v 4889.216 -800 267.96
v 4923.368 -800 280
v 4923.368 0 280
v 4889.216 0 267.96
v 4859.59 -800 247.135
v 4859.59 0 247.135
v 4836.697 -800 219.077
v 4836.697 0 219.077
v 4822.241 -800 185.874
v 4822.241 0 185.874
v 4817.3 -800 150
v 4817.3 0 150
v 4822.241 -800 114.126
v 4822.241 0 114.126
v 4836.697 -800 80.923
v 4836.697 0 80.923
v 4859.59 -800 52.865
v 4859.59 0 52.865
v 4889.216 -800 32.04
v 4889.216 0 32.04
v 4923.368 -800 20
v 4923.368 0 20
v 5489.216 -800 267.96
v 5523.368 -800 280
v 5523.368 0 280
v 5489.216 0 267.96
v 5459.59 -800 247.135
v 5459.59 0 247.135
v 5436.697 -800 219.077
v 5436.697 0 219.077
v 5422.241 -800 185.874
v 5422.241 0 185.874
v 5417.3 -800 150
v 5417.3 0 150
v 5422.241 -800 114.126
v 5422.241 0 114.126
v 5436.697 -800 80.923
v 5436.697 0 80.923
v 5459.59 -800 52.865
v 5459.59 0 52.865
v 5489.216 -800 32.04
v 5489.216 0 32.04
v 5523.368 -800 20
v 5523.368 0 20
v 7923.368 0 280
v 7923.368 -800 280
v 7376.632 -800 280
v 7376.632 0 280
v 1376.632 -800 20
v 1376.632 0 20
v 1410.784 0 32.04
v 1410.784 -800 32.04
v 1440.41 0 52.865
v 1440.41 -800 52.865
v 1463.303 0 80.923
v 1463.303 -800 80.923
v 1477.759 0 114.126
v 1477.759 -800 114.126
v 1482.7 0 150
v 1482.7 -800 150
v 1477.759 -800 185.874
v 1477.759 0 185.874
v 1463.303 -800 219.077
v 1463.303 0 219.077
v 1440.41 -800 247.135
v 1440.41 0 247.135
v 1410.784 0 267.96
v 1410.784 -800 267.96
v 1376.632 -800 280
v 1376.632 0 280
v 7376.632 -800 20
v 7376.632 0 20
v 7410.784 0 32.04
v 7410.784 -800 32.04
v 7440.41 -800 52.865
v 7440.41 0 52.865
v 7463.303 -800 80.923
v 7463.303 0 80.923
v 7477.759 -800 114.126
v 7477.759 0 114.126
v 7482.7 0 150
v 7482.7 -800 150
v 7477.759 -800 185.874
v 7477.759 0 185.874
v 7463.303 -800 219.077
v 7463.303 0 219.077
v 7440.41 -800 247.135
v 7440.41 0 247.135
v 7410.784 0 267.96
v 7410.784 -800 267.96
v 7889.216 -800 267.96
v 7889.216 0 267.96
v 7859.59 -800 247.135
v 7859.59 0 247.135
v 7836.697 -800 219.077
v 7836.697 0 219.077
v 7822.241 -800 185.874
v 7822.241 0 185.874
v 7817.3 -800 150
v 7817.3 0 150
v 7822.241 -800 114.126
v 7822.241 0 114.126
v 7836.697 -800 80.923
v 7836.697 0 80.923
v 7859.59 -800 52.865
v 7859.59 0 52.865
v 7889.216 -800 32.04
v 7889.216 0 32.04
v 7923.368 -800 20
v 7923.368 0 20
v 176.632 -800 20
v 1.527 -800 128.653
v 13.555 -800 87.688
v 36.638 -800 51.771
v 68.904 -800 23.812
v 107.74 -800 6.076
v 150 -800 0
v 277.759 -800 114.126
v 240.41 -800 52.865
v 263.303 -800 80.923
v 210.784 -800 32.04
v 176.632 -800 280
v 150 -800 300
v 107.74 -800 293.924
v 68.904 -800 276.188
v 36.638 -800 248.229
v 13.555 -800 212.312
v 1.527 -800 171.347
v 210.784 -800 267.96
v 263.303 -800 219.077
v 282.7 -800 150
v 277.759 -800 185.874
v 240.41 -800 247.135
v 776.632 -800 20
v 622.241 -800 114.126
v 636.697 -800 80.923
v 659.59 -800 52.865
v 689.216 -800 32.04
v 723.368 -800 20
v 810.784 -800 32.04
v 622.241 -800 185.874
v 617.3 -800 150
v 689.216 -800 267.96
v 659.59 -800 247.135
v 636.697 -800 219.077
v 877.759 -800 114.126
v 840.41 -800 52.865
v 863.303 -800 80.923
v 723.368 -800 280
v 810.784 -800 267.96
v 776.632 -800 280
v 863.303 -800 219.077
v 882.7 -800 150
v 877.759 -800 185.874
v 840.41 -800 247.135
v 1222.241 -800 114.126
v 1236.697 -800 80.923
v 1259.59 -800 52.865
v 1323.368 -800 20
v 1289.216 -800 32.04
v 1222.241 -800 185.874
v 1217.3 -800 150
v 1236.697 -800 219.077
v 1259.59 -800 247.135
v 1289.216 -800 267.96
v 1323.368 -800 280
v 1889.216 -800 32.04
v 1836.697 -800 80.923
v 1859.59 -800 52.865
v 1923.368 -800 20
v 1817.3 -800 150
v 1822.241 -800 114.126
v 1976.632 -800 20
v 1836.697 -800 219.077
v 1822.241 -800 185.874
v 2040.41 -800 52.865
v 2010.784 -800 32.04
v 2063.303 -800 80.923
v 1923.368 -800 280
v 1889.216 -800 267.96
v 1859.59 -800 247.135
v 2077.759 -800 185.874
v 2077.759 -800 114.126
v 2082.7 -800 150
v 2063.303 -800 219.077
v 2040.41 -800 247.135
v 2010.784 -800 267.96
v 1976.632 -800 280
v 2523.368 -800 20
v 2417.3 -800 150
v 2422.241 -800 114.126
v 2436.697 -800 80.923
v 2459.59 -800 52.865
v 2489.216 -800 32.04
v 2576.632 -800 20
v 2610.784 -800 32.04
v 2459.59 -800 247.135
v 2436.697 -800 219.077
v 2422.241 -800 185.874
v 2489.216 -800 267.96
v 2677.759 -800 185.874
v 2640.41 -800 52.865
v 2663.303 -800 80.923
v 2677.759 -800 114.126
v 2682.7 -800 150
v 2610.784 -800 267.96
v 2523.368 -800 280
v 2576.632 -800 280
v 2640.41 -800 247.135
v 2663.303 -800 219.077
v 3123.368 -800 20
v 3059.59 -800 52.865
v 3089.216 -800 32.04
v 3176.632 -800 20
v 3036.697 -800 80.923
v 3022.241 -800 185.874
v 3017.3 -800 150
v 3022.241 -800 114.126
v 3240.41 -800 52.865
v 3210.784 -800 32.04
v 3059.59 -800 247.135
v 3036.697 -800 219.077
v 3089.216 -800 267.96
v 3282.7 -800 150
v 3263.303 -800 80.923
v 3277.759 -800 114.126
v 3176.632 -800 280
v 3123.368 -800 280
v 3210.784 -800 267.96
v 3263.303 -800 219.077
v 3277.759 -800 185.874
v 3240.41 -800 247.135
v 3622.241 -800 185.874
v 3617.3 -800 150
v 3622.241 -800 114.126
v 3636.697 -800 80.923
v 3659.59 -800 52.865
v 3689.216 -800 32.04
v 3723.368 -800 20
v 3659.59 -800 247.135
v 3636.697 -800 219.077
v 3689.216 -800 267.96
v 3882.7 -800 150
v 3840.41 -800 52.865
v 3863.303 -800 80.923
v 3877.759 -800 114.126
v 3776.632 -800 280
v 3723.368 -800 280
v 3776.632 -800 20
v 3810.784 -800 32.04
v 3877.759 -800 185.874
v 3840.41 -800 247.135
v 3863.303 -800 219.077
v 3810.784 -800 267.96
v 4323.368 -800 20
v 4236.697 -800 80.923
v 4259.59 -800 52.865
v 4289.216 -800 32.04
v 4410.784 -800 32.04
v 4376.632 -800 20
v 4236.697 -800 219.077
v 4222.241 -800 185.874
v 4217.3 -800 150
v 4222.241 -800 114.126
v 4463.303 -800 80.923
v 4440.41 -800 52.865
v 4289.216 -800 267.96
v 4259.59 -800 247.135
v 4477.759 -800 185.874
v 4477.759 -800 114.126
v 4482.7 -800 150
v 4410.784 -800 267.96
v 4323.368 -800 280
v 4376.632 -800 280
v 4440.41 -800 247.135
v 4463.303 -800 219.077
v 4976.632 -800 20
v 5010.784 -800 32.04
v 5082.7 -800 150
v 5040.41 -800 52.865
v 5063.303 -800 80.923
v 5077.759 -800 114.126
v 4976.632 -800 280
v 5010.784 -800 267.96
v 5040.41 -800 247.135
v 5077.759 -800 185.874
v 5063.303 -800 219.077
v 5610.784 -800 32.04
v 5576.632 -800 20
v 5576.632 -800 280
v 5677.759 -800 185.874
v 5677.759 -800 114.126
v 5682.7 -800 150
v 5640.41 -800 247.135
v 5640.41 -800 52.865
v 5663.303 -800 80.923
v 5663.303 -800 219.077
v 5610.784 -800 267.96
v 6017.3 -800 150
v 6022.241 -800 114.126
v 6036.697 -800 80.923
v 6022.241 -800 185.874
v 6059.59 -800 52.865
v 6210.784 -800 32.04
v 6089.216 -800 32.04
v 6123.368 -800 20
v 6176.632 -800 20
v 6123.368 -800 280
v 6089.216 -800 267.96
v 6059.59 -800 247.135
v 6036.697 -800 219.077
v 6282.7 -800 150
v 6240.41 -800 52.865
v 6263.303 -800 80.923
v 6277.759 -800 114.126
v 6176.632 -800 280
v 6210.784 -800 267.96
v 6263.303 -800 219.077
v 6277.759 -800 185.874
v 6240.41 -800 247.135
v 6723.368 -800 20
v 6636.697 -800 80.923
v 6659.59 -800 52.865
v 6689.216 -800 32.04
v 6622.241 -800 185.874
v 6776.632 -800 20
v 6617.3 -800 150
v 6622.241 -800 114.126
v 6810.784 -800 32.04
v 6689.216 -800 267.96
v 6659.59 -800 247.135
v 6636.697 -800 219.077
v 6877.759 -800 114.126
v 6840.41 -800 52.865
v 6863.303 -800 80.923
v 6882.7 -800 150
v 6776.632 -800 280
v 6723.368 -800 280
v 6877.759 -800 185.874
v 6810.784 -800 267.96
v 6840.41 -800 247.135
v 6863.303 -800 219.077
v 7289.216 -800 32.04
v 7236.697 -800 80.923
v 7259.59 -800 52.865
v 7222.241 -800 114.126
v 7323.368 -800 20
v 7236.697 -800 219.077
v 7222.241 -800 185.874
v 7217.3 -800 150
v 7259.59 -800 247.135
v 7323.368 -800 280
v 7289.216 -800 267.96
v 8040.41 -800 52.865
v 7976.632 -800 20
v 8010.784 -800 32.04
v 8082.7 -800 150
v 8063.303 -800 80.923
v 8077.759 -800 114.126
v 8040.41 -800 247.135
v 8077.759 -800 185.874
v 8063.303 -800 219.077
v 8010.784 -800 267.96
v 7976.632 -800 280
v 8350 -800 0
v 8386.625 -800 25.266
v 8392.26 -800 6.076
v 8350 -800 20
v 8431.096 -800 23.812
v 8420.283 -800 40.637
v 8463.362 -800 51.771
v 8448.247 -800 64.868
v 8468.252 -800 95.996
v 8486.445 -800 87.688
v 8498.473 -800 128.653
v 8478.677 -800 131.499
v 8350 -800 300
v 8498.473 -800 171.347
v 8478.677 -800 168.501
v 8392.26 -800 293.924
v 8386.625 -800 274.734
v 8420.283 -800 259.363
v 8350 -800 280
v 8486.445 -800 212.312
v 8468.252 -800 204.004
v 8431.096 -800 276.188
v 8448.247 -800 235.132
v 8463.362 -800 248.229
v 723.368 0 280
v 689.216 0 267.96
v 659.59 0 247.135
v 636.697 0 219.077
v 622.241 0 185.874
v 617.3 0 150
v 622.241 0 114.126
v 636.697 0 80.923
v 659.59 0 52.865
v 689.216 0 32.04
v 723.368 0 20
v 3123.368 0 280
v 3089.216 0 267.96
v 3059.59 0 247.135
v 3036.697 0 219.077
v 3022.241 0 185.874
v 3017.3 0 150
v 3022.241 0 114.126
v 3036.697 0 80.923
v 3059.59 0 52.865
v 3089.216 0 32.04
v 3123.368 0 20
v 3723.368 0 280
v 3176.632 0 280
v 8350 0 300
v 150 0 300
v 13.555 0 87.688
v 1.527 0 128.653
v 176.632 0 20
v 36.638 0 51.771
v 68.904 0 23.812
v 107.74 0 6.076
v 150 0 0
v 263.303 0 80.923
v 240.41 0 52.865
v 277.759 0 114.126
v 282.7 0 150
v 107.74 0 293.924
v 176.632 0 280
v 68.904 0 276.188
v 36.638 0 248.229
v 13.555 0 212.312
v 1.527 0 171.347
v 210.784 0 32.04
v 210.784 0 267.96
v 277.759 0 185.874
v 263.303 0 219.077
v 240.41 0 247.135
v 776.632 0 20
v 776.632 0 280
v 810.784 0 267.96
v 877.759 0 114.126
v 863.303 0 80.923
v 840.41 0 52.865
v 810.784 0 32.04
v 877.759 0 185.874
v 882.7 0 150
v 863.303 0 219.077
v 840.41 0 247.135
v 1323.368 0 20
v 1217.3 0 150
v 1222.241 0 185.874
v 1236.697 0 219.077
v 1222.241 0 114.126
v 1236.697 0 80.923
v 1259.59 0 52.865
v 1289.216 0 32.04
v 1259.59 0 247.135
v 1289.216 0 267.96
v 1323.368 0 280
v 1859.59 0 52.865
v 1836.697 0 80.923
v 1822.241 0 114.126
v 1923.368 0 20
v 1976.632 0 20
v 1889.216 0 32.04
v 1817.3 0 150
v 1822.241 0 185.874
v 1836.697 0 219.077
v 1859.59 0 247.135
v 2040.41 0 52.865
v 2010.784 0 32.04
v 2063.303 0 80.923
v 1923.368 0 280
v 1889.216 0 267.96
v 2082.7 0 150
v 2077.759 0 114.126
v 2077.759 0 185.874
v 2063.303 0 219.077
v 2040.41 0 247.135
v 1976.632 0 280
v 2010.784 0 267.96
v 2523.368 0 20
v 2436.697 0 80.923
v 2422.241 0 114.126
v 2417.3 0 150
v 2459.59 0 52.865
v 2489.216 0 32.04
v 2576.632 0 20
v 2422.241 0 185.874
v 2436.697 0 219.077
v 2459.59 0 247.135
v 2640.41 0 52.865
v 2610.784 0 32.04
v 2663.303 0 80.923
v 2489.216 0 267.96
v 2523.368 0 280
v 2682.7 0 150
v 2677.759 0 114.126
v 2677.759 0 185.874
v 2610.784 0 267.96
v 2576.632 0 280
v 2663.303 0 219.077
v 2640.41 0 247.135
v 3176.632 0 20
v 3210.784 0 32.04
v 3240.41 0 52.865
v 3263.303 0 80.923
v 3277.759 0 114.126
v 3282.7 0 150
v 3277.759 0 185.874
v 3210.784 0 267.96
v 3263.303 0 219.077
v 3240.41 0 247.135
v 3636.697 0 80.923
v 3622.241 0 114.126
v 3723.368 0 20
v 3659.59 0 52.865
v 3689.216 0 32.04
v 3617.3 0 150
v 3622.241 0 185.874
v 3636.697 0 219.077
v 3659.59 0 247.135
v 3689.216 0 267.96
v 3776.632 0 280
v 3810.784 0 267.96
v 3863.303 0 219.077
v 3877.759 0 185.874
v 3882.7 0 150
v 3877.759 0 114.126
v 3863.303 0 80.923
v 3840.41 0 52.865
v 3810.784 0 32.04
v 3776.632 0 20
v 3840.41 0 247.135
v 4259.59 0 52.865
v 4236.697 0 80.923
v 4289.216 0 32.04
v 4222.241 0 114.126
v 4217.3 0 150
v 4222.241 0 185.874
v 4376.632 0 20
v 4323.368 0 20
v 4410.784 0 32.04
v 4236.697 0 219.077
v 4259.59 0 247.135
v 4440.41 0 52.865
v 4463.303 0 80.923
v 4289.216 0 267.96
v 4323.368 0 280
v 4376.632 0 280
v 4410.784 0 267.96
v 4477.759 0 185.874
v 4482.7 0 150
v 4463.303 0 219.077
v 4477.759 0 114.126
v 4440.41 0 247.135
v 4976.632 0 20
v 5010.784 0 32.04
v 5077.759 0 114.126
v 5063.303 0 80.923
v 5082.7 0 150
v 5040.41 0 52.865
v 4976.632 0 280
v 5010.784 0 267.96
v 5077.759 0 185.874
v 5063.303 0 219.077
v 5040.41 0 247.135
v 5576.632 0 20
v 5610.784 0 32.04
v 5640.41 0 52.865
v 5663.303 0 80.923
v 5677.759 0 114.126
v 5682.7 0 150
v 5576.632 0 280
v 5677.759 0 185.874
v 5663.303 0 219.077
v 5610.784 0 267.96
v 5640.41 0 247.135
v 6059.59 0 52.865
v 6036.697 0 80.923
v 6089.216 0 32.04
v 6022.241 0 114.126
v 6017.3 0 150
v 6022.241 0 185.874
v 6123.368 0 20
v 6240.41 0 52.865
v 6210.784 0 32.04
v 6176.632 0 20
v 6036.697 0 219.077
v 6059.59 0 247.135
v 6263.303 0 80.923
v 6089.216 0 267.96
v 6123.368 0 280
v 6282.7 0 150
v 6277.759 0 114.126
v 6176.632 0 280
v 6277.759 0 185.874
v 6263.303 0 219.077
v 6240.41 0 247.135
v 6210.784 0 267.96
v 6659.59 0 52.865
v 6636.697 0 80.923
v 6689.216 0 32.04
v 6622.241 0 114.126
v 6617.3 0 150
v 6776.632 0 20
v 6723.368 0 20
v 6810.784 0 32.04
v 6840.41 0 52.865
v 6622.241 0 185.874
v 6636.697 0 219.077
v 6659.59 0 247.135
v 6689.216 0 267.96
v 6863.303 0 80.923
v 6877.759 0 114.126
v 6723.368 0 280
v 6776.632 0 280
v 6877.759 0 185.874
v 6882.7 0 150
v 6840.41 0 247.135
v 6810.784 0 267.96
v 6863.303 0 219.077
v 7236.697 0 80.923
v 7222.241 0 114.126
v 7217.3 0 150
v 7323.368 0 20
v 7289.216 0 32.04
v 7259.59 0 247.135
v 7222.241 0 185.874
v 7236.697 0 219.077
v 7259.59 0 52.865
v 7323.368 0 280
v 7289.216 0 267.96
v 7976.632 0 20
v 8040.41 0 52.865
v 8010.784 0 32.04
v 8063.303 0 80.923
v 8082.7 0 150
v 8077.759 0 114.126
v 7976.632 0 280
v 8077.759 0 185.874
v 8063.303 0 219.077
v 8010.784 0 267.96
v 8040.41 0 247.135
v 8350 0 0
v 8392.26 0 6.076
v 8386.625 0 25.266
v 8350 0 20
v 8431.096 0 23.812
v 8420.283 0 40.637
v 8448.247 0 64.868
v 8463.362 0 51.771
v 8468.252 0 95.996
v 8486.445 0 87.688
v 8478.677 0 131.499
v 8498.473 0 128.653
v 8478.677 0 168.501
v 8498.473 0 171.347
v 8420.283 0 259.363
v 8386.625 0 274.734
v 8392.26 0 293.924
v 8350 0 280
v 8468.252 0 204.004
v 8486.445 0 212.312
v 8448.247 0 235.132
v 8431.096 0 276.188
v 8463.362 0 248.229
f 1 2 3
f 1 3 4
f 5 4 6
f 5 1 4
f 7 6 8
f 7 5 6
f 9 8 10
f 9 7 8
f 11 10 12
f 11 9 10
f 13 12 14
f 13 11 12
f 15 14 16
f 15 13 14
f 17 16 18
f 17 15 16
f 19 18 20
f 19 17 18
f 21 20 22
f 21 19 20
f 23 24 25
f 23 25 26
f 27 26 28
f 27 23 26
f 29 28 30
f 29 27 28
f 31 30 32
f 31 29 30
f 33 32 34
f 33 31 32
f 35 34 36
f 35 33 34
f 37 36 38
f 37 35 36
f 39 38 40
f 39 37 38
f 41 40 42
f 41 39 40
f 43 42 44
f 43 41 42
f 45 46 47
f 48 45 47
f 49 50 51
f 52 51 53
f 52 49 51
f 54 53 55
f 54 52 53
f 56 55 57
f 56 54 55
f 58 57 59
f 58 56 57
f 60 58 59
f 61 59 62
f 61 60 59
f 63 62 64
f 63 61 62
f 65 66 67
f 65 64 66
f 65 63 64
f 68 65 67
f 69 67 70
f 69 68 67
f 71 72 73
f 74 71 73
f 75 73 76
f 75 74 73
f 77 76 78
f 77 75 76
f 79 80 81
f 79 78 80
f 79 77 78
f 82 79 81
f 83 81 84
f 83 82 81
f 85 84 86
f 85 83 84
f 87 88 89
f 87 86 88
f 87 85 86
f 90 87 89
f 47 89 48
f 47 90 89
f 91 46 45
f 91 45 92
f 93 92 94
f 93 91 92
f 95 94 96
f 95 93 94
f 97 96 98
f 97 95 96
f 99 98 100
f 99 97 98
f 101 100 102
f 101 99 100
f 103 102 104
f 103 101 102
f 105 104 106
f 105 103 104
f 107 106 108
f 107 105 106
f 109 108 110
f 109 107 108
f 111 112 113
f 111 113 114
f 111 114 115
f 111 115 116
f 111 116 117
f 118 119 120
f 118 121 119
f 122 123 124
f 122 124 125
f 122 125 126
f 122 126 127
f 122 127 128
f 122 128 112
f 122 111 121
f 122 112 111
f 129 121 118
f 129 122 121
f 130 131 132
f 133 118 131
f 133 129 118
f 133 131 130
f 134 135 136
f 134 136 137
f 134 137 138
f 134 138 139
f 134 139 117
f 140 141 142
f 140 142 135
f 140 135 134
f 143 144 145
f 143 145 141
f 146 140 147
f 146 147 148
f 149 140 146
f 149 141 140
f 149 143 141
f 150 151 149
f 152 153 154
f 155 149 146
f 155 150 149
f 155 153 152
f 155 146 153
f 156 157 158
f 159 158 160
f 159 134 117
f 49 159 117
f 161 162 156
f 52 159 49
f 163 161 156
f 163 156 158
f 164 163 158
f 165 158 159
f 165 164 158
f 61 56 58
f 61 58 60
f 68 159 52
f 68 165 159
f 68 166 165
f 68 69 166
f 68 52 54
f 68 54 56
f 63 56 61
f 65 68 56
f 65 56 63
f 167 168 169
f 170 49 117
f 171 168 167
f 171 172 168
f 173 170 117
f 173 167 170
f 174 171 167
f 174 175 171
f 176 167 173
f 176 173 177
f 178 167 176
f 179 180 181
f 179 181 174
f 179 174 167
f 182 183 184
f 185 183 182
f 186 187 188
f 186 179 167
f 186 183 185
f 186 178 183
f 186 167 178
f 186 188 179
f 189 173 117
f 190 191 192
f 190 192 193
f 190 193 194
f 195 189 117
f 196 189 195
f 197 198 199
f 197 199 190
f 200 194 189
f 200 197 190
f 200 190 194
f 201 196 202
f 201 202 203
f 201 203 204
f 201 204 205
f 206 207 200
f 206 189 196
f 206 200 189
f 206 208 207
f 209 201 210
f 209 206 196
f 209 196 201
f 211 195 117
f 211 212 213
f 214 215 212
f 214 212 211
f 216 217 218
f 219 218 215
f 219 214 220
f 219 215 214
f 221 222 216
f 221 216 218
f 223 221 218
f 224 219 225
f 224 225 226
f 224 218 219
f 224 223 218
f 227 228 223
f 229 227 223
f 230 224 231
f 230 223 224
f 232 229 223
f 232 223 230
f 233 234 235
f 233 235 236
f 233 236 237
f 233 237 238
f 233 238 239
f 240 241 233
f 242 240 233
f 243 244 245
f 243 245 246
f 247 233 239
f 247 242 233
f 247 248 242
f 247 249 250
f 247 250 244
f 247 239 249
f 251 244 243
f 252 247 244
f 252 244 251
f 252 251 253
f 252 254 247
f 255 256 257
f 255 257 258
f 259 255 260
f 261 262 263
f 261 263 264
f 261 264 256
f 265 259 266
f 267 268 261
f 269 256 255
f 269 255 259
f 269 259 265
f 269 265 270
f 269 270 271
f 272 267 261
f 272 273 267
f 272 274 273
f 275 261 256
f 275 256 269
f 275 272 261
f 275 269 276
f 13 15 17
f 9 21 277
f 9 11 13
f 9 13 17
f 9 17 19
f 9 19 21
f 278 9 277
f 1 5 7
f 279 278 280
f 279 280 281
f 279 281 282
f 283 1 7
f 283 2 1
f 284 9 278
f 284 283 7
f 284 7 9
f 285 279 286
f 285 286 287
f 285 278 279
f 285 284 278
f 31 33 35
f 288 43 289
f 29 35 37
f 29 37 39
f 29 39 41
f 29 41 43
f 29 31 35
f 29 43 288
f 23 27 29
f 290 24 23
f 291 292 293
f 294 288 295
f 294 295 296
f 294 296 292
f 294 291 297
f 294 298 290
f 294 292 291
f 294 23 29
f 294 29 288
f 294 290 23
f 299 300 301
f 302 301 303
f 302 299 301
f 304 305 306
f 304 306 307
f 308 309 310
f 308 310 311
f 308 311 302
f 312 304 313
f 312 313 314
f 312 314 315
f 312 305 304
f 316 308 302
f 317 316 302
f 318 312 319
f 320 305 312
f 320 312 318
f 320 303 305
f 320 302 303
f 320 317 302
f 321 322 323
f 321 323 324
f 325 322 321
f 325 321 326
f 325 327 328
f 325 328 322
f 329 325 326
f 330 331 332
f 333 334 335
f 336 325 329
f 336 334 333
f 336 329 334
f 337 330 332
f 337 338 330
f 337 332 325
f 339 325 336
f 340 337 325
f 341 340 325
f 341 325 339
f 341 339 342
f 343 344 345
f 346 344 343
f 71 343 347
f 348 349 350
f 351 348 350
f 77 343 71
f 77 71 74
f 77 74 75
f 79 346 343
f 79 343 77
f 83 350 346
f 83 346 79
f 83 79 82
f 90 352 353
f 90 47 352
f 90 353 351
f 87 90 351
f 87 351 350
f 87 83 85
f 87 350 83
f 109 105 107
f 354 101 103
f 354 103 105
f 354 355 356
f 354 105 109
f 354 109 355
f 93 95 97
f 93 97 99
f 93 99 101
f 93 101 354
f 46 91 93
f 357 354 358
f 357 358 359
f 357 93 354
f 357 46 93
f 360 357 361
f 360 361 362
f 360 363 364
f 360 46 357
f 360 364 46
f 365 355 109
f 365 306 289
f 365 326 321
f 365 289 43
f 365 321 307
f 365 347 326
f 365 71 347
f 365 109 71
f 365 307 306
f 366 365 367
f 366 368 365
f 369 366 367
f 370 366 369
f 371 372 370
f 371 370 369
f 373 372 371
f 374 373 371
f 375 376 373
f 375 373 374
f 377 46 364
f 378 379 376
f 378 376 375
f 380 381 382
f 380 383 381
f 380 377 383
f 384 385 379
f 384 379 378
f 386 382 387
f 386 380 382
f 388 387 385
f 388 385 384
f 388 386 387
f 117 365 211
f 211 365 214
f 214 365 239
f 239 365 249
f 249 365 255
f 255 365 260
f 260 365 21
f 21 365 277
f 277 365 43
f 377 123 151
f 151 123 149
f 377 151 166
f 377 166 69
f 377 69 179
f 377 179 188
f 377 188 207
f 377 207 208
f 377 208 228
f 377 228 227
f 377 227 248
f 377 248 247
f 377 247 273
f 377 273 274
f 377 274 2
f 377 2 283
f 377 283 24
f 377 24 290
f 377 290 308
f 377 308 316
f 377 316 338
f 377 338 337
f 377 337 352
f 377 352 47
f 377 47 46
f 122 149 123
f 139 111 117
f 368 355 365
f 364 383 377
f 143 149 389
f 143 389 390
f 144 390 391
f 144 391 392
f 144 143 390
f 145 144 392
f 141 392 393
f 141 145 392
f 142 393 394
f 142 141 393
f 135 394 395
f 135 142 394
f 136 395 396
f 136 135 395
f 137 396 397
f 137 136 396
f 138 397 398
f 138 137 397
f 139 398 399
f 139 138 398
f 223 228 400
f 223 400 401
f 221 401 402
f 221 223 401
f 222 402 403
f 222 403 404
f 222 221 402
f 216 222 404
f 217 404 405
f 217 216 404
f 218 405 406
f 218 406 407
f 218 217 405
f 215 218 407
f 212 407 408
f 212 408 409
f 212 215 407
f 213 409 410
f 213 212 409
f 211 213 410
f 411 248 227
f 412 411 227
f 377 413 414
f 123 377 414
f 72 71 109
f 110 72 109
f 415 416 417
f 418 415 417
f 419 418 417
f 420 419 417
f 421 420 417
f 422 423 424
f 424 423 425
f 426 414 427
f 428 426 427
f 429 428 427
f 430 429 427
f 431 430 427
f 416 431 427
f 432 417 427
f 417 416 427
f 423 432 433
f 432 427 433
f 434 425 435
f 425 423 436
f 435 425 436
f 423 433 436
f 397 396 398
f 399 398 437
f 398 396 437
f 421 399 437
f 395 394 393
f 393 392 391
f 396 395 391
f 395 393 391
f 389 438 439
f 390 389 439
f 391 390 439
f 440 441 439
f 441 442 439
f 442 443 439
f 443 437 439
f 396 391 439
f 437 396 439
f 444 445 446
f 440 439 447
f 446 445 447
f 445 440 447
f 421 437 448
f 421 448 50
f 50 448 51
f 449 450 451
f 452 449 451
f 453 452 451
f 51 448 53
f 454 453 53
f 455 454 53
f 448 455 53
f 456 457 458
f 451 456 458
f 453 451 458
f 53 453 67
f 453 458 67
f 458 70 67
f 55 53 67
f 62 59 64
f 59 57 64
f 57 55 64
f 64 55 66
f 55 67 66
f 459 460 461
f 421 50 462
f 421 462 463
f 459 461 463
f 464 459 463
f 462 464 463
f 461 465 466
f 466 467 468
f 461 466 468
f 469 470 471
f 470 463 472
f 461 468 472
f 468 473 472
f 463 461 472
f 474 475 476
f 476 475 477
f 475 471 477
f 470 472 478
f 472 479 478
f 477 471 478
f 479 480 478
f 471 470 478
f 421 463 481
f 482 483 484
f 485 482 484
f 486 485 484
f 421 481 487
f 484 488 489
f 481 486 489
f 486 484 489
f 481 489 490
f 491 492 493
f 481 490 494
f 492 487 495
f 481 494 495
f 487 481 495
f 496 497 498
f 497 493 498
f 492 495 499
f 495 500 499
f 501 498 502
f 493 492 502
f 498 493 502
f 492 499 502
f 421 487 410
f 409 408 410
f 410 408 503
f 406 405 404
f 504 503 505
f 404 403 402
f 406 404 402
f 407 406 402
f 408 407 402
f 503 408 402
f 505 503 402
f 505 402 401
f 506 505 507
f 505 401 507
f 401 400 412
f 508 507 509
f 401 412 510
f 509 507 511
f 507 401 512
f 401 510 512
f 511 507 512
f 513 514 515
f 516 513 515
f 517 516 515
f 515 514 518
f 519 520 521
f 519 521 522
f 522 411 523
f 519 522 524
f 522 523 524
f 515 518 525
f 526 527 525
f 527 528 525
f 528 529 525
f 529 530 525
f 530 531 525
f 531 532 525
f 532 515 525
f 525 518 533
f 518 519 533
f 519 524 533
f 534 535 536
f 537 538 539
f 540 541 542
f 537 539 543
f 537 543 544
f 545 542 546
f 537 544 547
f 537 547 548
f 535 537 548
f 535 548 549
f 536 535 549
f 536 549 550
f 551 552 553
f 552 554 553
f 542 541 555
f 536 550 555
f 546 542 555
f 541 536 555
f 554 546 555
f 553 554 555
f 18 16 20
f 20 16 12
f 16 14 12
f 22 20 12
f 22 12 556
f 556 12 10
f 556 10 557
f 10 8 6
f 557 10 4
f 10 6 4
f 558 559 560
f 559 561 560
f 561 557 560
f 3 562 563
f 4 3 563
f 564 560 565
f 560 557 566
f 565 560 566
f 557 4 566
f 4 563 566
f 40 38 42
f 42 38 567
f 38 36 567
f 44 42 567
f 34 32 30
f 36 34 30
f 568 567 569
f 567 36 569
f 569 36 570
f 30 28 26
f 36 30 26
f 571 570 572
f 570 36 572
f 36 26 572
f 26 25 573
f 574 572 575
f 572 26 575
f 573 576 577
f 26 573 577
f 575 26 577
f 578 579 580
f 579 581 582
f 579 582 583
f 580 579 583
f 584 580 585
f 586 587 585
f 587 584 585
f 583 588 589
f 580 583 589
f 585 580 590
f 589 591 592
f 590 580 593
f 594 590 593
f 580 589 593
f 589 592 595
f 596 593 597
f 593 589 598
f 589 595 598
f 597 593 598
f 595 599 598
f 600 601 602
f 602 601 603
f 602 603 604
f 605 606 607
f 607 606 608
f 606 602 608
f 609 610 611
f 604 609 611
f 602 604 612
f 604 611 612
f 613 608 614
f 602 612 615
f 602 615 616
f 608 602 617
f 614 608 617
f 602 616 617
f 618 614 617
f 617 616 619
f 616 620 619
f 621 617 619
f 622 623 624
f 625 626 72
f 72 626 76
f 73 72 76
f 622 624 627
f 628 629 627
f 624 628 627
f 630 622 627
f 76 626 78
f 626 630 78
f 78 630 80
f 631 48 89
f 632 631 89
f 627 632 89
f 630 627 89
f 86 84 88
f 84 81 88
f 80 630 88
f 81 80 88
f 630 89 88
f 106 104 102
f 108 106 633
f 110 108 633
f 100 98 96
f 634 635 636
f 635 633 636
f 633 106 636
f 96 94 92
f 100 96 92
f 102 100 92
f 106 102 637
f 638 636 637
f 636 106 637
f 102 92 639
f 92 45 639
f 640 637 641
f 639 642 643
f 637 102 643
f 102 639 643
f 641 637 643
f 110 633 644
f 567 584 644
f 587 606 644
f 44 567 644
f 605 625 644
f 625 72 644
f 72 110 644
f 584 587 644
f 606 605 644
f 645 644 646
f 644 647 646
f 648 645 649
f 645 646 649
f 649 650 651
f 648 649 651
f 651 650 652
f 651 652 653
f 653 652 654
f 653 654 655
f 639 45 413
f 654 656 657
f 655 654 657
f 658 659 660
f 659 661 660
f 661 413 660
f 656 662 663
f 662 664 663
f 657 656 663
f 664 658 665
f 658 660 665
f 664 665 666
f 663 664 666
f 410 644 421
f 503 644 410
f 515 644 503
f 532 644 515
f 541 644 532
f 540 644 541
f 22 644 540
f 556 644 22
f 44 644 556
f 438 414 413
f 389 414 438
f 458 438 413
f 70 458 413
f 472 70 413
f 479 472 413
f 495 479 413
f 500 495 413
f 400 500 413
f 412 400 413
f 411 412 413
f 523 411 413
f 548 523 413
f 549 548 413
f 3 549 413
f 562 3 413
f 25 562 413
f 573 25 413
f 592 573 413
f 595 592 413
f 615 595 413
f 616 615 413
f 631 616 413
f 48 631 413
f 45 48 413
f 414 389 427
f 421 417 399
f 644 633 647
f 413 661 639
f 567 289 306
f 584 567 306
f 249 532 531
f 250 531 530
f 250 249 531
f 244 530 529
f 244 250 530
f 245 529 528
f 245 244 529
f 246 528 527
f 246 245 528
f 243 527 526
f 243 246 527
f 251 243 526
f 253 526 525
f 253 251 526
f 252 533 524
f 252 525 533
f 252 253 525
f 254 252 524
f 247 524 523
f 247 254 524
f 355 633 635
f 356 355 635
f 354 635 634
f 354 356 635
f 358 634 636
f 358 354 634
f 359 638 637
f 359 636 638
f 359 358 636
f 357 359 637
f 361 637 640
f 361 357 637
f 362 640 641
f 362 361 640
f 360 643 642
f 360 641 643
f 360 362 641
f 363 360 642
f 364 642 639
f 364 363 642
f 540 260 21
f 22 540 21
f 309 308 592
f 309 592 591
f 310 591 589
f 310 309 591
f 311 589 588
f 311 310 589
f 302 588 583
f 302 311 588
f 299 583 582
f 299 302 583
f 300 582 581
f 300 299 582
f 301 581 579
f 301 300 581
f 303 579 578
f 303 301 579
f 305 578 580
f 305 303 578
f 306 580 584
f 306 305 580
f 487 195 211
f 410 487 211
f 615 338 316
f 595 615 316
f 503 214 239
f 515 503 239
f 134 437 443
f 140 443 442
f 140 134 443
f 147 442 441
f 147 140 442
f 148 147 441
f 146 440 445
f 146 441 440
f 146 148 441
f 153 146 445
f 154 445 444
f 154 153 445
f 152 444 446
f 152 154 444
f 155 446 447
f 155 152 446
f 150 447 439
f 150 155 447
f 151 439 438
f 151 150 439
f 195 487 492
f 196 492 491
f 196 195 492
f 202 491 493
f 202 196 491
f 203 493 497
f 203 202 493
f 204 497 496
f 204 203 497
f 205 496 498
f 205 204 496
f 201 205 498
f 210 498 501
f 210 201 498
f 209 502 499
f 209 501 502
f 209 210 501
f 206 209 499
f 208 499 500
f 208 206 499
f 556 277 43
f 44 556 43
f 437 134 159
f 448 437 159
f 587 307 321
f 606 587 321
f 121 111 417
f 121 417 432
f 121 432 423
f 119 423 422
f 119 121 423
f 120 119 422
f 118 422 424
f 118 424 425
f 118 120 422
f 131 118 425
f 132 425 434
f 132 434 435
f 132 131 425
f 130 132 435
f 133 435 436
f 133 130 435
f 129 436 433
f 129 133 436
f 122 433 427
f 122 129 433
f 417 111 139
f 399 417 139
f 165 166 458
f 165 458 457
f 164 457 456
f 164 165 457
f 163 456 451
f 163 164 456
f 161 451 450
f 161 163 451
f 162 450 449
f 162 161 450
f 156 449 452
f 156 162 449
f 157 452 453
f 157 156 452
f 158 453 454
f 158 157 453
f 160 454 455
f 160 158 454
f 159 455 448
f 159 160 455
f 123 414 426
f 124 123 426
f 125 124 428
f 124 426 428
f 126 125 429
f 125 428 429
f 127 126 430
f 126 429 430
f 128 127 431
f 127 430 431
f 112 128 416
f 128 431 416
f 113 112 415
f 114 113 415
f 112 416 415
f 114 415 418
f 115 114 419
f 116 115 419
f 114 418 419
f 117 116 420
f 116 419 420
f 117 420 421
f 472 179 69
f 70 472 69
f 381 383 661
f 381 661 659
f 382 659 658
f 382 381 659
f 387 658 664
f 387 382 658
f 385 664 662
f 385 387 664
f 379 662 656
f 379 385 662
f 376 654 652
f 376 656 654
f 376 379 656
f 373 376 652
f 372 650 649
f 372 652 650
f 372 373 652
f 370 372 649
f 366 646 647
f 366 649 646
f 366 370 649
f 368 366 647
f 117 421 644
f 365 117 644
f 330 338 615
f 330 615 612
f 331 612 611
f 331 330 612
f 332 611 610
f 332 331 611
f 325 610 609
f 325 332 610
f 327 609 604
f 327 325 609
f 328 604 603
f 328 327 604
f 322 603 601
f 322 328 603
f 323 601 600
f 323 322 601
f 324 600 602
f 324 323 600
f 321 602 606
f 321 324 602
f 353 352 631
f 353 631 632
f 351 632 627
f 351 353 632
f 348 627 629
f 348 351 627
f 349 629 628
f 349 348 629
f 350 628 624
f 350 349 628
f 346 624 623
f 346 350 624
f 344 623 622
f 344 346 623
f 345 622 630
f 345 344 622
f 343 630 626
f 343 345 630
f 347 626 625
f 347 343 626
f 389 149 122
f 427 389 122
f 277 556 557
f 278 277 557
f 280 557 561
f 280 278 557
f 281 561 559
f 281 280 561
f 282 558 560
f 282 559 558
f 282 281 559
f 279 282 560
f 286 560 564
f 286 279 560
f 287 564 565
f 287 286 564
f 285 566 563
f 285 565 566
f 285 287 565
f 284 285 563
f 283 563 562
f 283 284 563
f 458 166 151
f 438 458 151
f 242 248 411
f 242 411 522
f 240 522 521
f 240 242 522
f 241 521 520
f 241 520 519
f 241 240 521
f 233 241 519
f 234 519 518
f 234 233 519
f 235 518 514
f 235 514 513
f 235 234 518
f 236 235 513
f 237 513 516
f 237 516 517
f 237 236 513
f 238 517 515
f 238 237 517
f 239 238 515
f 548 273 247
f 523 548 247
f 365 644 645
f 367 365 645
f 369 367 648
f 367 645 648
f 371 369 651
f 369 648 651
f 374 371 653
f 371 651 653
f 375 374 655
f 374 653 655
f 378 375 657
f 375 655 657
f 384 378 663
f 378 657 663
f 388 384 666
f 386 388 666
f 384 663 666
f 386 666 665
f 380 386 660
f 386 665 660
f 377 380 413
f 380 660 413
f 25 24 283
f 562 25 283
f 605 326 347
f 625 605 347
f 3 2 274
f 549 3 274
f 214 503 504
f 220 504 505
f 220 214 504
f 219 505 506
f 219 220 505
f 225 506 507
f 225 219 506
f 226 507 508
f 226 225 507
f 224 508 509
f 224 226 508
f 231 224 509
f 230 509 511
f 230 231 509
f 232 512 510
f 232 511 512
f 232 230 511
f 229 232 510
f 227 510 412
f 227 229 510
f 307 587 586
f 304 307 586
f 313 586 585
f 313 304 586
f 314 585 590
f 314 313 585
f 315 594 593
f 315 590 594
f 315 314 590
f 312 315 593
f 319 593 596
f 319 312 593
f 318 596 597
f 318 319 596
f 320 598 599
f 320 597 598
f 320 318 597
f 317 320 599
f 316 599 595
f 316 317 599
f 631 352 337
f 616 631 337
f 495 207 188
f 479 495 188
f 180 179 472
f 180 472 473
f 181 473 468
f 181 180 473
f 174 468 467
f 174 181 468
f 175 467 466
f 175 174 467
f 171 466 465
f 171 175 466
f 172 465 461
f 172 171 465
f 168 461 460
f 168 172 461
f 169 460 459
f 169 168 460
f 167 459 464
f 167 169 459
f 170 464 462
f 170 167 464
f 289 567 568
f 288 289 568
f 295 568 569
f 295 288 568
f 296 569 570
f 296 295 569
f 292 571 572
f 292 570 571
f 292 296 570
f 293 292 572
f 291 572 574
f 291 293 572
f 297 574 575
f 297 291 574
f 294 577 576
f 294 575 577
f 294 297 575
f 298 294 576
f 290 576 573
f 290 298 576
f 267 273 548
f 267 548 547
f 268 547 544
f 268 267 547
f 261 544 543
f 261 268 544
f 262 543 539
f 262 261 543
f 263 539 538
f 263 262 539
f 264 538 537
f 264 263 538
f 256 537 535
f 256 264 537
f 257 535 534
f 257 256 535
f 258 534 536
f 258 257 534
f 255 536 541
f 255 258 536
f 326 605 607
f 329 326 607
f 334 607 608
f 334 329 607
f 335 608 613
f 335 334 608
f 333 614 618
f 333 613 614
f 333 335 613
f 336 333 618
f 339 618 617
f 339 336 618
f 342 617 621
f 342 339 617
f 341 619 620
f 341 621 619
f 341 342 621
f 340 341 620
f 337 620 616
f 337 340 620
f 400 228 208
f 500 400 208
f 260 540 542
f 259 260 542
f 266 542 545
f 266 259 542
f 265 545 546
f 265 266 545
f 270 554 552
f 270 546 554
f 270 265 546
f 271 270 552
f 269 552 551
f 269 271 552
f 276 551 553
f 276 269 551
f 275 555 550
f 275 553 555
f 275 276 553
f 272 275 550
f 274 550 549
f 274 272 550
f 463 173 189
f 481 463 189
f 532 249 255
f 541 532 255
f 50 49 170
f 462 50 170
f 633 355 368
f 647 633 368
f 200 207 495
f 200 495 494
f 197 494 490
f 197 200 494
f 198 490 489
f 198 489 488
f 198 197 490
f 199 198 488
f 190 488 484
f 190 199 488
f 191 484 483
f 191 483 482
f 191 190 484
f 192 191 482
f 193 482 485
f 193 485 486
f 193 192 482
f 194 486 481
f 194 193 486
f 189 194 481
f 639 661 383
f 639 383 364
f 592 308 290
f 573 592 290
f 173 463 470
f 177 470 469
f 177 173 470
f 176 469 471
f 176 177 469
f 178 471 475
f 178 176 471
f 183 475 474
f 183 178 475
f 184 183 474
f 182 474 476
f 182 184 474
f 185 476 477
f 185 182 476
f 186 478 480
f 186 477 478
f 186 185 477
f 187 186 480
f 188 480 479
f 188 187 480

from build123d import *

# Parameters (mm, degrees)
F1_DEPTH = 800
F2_T     = -20
F3_DEPTH = 25
F4_R     = 132.699842737
F5_DEPTH = 800


with BuildPart() as f1:
    # F0 (on Front) → F1 (new body)
    with BuildSketch(Plane.XZ):
        with BuildLine():
            ThreePointArc((0, 150), (43.933982822, 43.933982822), (150, 0))
            Line((150, 0), (8350, 0))
            ThreePointArc((8350, 0), (8456.066017178, 43.933982822), (8500, 150))
            ThreePointArc((8500, 150), (8456.066017178, 256.066017178), (8350, 300))
            Line((8350, 300), (150, 300))
            ThreePointArc((150, 300), (43.933982822, 256.066017178), (0, 150))
        make_face()
    extrude(amount=F1_DEPTH)

    # F2
    f2_openings = [f1.faces().sort_by_distance(p)[0] for p in [
        (4250, -800, 150),
    ]]
    offset(amount=F2_T, openings=f2_openings)

    # F3 (cut): a face of the model
    f3_faces = [f1.faces().sort_by_distance(p)[0] for p in [
        (4250, -20, 150),
    ]]
    extrude(f3_faces, amount=-F3_DEPTH, mode=Mode.SUBTRACT)

    # F4 (on face) → F5 (join)
    with BuildSketch(Plane.XZ.offset(800)):
        with Locations((150, 150)):
            Circle(F4_R)
        with Locations((750, 150)):
            Circle(F4_R)
        with Locations((1350, 150)):
            Circle(F4_R)
        with Locations((1950, 150)):
            Circle(F4_R)
        with Locations((2550, 150)):
            Circle(F4_R)
        with Locations((3150, 150)):
            Circle(F4_R)
        with Locations((3750, 150)):
            Circle(F4_R)
        with Locations((4350, 150)):
            Circle(F4_R)
        with Locations((4950, 150)):
            Circle(F4_R)
        with Locations((5550, 150)):
            Circle(F4_R)
        with Locations((6150, 150)):
            Circle(F4_R)
        with Locations((6750, 150)):
            Circle(F4_R)
        with Locations((7350, 150)):
            Circle(F4_R)
        with Locations((7950, 150)):
            Circle(F4_R)
    extrude(amount=-F5_DEPTH)


solid = f1.part
